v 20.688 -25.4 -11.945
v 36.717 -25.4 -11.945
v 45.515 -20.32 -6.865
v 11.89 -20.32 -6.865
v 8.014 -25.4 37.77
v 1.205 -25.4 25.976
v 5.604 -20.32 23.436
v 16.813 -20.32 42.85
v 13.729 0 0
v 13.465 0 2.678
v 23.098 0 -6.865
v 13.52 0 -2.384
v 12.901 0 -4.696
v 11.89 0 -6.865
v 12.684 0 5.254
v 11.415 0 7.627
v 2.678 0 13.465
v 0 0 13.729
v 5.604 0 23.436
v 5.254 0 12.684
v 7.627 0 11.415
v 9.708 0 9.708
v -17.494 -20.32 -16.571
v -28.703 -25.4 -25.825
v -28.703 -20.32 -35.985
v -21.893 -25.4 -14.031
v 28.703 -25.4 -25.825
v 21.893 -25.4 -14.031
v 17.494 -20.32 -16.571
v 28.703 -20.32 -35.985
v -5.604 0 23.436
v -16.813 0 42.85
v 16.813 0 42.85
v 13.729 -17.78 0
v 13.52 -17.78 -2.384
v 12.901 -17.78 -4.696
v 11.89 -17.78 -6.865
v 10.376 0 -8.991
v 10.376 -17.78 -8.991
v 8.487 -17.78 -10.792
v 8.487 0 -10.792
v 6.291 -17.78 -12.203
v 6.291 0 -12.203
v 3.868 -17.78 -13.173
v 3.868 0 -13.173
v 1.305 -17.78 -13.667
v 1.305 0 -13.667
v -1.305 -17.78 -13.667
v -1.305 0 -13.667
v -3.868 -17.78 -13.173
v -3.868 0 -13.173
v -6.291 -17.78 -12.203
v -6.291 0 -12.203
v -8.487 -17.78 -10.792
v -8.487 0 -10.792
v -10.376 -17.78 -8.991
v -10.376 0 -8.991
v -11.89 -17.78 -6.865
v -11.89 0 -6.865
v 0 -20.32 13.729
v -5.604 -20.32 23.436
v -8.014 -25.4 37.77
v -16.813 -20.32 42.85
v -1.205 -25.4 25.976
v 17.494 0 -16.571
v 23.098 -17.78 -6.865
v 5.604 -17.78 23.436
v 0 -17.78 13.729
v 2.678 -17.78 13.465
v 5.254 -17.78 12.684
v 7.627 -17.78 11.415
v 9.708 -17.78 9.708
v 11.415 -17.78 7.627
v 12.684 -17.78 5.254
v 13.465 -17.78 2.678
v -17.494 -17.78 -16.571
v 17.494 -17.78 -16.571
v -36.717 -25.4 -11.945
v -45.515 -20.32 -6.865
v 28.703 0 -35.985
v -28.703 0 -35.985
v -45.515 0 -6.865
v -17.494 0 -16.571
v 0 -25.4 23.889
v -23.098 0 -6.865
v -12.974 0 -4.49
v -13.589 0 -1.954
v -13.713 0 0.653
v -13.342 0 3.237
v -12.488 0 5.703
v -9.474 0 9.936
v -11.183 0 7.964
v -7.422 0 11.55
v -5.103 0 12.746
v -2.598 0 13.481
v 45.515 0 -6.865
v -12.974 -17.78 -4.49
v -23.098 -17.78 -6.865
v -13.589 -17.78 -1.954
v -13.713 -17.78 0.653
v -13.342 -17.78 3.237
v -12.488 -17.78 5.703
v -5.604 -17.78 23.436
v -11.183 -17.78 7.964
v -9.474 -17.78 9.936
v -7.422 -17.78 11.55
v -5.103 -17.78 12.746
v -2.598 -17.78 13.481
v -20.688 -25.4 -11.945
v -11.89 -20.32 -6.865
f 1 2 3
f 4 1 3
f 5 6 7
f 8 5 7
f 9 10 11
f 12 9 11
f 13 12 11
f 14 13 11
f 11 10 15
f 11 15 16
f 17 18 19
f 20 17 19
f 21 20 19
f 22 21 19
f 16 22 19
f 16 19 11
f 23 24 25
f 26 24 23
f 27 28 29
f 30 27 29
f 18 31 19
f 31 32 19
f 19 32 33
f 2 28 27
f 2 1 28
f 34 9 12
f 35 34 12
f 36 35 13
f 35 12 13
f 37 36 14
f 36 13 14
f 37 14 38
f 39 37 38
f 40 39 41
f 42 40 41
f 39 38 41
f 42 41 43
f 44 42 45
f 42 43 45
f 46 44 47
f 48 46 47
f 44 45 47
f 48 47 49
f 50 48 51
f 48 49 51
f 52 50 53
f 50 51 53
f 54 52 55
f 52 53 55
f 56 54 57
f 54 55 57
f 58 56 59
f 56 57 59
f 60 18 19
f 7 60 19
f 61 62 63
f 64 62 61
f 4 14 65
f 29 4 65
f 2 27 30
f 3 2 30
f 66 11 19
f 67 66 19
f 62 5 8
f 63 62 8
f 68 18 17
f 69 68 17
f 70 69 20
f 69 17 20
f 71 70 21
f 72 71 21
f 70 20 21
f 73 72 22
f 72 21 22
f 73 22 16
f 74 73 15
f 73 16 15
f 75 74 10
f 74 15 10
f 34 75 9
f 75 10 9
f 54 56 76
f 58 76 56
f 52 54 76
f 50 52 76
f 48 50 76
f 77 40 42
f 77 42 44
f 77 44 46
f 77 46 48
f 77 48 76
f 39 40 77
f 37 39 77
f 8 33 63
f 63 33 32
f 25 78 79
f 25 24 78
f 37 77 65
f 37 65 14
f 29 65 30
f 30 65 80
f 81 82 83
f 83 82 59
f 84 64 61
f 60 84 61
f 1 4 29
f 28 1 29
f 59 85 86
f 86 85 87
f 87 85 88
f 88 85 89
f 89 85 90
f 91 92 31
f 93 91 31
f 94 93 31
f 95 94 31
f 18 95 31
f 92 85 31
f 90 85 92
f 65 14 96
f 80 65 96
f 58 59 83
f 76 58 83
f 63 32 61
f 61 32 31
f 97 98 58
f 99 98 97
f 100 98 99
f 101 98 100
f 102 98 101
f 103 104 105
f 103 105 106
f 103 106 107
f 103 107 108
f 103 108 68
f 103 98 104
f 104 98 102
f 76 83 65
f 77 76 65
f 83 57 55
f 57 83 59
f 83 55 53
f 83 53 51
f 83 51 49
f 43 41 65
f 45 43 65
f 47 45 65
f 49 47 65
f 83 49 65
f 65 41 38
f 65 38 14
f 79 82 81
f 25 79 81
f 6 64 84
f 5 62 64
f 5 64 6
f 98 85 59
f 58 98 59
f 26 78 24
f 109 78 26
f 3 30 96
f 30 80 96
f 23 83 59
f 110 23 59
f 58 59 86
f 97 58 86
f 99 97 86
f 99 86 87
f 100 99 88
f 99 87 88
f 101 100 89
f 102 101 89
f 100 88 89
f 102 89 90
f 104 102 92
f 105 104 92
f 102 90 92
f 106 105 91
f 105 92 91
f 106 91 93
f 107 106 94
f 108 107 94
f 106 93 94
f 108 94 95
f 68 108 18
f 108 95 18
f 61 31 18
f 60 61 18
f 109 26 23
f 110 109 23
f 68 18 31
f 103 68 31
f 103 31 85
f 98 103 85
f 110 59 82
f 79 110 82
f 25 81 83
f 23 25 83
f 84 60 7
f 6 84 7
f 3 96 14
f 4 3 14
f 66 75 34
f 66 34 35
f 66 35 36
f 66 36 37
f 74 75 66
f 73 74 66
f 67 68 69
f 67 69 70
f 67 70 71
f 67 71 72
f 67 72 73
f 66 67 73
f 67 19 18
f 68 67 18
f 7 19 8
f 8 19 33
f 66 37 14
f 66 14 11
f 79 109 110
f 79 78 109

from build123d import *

# Parameters (mm, degrees)
F1_DEPTH  = 25.4
F2_DEPTH  = 17.78
F3_SIZE   = 5.08
F3_2_SIZE = 5.08
F3_3_SIZE = 5.08
F4_SIZE   = 5.08


with BuildPart() as f1:
    # F0 (on Front) → F1 (new body)
    with BuildSketch(Plane.XZ):
        Polygon((45.5153971005, -6.864500683), (23.0982416679, -6.864500683), (28.702530526, -16.5714137256), (17.4939528097, -16.5714137256), (28.702530526, -35.9852398108), align=None)
        Polygon((28.702530526, -16.5714137256), (23.0982416679, -6.864500683), (11.8896639515, -6.864500683), align=None)
        Polygon((17.4939528097, -16.5714137256), (28.702530526, -16.5714137256), (11.8896639515, -6.864500683), align=None)
    extrude(amount=F1_DEPTH)

    # F3#2
    f3_2_edges = [f1.edges().sort_by_distance(p)[0] for p in [
        (28.702531, -25.4, -6.864501),
        (20.296097, -25.4, -21.42487),
    ]]
    chamfer(f3_2_edges, length=F3_2_SIZE)

    # F4
    f4_edges = [f1.edges().sort_by_distance(p)[0] for p in [
        (37.108964, -25.4, -21.42487),
    ]]
    chamfer(f4_edges, length=F4_SIZE)


with BuildPart() as f1b:
    # F0 (on Front) → F1, piece 2 (new body)
    with BuildSketch(Plane.XZ):
        Polygon((-28.702530526, -16.5714137256), (-23.0982416679, -6.864500683), (-45.5153971005, -6.864500683), (-28.702530526, -35.9852398108), (-17.4939528097, -16.5714137256), align=None)
        Polygon((-11.8896639515, -6.864500683), (-23.0982416679, -6.864500683), (-28.702530526, -16.5714137256), align=None)
        Polygon((-17.4939528097, -16.5714137256), (-11.8896639515, -6.864500683), (-28.702530526, -16.5714137256), align=None)
    extrude(amount=F1_DEPTH)

    # F3#3
    f3_3_edges = [f1b.edges().sort_by_distance(p)[0] for p in [
        (-20.296097, -25.4, -21.42487),
        (-28.702531, -25.4, -6.864501),
        (-37.108964, -25.4, -21.42487),
    ]]
    chamfer(f3_3_edges, length=F3_3_SIZE)


with BuildPart() as f1c:
    # F0 (on Front) → F1, piece 3 (new body)
    with BuildSketch(Plane.XZ):
        Polygon((5.6042888582, 23.4359144086), (0, 33.1428274512), (0, 13.729001366), align=None)
        Polygon((0, 13.729001366), (0, 33.1428274512), (-5.6042888582, 23.4359144086), align=None)
        Polygon((-5.6042888582, 23.4359144086), (0, 33.1428274512), (5.6042888582, 23.4359144086), (16.8128665745, 42.8497404938), (-16.8128665745, 42.8497404938), align=None)
    extrude(amount=F1_DEPTH)

    # F3
    f3_edges = [f1c.edges().sort_by_distance(p)[0] for p in [
        (-8.406433, -25.4, 28.289371),
        (8.406433, -25.4, 28.289371),
        (0, -25.4, 42.84974),
    ]]
    chamfer(f3_edges, length=F3_SIZE)


with BuildPart() as f2:
    # F0 (on Front) → F2 (new body)
    with BuildSketch(Plane.XZ):
        with BuildLine():
            Line((23.0982416679, -6.864500683), (5.6042888582, 23.4359144086))
            Line((5.6042888582, 23.4359144086), (0, 13.729001366))
            ThreePointArc((0, 13.729001366), (9.7078699648, 9.7078699648), (13.729001366, 0))
            ThreePointArc((13.729001366, 0), (13.2611969886, -3.5533270238), (11.8896639515, -6.864500683))
            Line((11.8896639515, -6.864500683), (23.0982416679, -6.864500683))
        make_face()
    extrude(amount=F2_DEPTH)


with BuildPart() as f2b:
    # F0 (on Front) → F2, piece 2 (new body)
    with BuildSketch(Plane.XZ):
        with BuildLine():
            ThreePointArc((11.8896639515, -6.864500683), (0, -13.729001366), (-11.8896639515, -6.864500683))
            Line((-11.8896639515, -6.864500683), (-17.4939528097, -16.5714137256))
            Line((-17.4939528097, -16.5714137256), (17.4939528097, -16.5714137256))
            Line((17.4939528097, -16.5714137256), (11.8896639515, -6.864500683))
        make_face()
    extrude(amount=F2_DEPTH)


with BuildPart() as f2c:
    # F0 (on Front) → F2, piece 3 (new body)
    with BuildSketch(Plane.XZ):
        with BuildLine():
            Line((0, 13.729001366), (-5.6042888582, 23.4359144086))
            Line((-5.6042888582, 23.4359144086), (-23.0982416679, -6.864500683))
            Line((-23.0982416679, -6.864500683), (-11.8896639515, -6.864500683))
            ThreePointArc((-11.8896639515, -6.864500683), (-11.8896639515, 6.864500683), (0, 13.729001366))
        make_face()
    extrude(amount=F2_DEPTH)


solid = Compound([f1.part, f1b.part, f1c.part, f2.part, f2b.part, f2c.part])
